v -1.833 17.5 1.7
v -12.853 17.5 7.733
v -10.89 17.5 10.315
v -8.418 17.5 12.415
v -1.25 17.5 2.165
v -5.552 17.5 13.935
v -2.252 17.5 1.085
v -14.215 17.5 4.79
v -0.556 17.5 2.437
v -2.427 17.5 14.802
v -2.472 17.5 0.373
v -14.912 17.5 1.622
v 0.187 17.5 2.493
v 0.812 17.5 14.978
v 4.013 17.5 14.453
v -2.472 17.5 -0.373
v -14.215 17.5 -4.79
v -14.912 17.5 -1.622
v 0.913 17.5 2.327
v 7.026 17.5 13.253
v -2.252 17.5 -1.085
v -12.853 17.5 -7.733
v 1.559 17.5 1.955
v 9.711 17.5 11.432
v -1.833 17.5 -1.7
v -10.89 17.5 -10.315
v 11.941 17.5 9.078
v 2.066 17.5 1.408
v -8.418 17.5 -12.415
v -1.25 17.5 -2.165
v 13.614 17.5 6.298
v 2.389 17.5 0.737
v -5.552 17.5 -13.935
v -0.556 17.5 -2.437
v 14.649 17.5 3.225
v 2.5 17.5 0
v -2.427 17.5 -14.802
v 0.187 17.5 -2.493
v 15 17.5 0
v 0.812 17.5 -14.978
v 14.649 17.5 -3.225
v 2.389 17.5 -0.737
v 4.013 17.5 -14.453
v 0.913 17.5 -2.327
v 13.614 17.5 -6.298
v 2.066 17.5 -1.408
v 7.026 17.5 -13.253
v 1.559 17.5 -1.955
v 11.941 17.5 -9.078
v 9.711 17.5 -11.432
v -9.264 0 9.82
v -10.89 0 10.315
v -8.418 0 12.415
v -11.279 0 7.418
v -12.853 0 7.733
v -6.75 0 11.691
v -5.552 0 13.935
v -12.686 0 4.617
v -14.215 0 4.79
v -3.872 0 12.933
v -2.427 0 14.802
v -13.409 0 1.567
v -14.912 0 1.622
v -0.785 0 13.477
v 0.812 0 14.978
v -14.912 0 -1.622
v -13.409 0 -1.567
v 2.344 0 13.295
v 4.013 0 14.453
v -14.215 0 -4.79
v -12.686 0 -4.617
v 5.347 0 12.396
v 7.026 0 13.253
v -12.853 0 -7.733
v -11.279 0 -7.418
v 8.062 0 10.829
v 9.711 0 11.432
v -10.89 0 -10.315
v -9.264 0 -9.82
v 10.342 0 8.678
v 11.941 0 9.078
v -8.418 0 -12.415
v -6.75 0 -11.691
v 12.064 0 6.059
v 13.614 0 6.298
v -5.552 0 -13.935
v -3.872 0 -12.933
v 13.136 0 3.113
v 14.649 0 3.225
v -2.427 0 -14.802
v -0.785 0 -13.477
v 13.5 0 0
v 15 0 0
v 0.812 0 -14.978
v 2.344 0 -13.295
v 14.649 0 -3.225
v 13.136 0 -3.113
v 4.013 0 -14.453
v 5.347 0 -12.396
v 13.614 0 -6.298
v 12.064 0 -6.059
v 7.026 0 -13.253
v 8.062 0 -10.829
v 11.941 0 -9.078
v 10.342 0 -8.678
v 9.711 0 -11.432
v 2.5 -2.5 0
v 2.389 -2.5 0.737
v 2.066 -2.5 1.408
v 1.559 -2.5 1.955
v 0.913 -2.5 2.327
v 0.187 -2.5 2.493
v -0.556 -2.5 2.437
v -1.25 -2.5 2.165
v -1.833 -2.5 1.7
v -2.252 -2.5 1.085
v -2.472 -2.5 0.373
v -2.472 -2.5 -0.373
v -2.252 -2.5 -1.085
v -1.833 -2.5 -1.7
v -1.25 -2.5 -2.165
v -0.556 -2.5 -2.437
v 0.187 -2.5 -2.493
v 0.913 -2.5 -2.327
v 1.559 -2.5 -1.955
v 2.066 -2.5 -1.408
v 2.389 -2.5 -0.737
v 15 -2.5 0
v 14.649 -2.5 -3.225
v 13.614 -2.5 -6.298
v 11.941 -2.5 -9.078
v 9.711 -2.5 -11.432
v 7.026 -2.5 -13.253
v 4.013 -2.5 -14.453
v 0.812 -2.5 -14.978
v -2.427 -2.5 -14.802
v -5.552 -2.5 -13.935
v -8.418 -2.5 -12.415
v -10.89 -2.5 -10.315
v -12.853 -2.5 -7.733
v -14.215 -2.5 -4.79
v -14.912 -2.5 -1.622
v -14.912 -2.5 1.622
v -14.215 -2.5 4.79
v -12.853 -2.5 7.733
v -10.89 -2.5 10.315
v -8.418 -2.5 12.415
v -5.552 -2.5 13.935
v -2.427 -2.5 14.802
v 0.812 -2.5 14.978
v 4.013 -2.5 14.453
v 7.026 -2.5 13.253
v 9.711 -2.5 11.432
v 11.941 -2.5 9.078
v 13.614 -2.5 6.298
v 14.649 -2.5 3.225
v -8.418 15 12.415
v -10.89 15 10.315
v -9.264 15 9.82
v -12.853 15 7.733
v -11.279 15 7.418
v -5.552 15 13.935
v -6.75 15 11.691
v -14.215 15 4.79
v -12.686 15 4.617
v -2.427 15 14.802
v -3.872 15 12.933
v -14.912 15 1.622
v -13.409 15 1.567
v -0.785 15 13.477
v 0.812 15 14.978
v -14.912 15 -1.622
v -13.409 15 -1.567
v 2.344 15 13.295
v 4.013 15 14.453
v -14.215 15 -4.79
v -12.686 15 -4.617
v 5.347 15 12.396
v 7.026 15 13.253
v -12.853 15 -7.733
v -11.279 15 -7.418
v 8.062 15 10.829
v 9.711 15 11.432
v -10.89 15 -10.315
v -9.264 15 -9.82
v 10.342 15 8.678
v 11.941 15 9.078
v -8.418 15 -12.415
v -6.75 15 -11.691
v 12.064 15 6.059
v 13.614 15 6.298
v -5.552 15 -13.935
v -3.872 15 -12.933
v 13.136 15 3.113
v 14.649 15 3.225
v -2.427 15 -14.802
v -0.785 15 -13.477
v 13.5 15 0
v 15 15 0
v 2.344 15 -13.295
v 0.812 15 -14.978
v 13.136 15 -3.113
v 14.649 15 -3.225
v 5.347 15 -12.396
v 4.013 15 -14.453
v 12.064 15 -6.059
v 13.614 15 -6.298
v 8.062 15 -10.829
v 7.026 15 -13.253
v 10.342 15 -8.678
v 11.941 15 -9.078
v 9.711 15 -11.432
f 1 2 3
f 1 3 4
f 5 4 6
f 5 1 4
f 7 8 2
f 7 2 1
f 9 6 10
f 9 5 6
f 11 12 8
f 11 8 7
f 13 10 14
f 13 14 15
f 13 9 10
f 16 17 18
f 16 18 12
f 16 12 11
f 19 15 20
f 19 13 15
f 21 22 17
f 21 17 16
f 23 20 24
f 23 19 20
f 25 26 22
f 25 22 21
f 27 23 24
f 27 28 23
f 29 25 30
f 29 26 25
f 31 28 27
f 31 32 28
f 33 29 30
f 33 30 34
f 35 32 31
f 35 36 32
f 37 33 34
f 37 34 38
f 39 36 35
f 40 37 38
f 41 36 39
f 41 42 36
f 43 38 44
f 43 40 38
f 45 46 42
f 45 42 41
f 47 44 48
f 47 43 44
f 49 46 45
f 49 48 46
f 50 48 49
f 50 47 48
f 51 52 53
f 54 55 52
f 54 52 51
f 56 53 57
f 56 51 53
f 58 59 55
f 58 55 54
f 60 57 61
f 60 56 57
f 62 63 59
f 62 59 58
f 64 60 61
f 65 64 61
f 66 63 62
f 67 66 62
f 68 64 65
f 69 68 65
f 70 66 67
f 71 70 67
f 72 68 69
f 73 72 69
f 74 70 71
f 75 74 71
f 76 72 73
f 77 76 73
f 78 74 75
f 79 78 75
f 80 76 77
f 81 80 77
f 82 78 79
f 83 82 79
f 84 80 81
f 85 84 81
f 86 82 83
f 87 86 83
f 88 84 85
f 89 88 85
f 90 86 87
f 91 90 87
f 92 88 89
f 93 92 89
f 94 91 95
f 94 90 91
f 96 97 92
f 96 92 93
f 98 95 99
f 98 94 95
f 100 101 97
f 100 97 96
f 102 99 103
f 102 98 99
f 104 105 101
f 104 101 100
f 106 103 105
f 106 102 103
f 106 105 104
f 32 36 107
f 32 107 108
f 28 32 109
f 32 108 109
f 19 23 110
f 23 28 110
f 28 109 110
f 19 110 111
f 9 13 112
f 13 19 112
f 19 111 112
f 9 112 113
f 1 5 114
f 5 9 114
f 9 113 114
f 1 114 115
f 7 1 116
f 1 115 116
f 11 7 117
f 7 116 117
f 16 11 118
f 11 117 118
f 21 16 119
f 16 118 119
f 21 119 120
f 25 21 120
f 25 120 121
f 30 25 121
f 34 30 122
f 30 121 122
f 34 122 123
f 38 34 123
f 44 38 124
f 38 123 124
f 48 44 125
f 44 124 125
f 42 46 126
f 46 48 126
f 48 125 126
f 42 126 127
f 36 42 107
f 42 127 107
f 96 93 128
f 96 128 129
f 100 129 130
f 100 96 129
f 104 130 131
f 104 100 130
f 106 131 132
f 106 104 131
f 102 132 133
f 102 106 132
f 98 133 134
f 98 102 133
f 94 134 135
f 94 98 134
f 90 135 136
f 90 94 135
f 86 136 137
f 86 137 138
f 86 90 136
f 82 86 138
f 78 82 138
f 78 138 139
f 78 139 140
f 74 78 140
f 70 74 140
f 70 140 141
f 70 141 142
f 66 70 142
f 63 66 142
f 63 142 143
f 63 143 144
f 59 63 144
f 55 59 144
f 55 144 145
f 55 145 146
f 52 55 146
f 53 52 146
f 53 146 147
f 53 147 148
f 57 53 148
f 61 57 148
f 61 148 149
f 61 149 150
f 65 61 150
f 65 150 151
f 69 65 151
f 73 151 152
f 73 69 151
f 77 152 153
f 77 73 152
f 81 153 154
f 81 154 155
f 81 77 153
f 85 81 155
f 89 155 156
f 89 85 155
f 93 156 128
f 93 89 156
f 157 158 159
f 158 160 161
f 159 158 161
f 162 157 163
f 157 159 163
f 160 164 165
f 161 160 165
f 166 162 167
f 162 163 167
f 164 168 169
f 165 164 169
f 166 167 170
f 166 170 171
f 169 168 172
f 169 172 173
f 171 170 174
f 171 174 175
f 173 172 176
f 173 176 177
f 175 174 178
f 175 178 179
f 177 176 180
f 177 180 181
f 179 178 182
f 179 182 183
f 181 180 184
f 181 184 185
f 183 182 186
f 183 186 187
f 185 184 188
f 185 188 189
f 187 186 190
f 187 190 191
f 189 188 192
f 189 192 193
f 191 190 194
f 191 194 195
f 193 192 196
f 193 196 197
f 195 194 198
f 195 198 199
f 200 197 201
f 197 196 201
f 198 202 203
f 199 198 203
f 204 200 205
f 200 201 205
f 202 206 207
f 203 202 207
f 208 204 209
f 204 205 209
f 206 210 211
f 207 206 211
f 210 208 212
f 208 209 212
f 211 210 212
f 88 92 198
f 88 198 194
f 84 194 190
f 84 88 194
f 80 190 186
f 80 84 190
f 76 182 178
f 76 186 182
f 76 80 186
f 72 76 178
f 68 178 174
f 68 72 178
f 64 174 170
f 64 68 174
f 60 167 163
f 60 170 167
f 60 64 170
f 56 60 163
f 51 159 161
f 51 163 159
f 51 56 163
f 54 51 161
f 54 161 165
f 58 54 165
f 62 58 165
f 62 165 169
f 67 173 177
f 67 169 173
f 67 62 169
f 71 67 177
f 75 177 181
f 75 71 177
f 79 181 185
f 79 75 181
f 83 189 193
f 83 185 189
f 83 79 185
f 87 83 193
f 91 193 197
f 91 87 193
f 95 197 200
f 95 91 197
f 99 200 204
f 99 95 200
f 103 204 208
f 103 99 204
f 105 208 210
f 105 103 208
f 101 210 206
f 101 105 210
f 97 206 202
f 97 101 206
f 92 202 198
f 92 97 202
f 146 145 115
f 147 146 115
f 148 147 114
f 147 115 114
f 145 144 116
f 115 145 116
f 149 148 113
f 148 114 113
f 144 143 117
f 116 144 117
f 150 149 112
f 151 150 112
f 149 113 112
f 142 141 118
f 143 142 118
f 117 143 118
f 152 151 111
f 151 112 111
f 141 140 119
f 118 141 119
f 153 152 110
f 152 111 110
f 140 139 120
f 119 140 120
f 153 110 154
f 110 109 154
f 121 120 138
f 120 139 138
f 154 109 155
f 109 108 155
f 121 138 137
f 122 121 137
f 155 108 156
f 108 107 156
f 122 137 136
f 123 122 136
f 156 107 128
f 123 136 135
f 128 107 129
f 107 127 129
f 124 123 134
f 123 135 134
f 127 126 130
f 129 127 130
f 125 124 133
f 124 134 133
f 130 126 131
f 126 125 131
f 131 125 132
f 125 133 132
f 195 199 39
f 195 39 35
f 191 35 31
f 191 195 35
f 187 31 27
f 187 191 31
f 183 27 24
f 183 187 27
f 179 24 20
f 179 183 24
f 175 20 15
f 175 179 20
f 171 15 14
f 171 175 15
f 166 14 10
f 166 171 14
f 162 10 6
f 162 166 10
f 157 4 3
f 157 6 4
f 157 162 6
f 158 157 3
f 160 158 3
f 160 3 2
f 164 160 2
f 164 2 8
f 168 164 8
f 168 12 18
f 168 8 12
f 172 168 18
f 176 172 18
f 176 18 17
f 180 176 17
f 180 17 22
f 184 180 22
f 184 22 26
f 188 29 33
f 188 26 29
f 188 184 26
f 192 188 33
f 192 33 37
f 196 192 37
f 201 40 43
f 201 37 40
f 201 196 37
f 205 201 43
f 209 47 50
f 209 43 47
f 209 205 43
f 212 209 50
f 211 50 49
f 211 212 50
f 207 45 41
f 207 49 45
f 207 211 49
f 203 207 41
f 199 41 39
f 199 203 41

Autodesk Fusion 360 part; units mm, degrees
sketch "Sketch1" plane through (0, 0, 0) normal (0, 1, 0) x (1, 0, 0)
  circle A0 centre (0, 0) radius 2.5
  circle A1 centre (0, 0) radius 13.5
  circle A2 centre (0, 0) radius 15
  dimension "d1" = 5
  dimension "d2" = 27
extrude "Extrude1" add sketch "Sketch1" against normal blind 2.5 contours A1 | A2
extrude "Extrude2" add sketch "Sketch1" along normal blind 15 contours A1
extrude "Extrude3" add sketch "Sketch1" along normal blind 2.5 from surface at 15 contours A1 | A2
